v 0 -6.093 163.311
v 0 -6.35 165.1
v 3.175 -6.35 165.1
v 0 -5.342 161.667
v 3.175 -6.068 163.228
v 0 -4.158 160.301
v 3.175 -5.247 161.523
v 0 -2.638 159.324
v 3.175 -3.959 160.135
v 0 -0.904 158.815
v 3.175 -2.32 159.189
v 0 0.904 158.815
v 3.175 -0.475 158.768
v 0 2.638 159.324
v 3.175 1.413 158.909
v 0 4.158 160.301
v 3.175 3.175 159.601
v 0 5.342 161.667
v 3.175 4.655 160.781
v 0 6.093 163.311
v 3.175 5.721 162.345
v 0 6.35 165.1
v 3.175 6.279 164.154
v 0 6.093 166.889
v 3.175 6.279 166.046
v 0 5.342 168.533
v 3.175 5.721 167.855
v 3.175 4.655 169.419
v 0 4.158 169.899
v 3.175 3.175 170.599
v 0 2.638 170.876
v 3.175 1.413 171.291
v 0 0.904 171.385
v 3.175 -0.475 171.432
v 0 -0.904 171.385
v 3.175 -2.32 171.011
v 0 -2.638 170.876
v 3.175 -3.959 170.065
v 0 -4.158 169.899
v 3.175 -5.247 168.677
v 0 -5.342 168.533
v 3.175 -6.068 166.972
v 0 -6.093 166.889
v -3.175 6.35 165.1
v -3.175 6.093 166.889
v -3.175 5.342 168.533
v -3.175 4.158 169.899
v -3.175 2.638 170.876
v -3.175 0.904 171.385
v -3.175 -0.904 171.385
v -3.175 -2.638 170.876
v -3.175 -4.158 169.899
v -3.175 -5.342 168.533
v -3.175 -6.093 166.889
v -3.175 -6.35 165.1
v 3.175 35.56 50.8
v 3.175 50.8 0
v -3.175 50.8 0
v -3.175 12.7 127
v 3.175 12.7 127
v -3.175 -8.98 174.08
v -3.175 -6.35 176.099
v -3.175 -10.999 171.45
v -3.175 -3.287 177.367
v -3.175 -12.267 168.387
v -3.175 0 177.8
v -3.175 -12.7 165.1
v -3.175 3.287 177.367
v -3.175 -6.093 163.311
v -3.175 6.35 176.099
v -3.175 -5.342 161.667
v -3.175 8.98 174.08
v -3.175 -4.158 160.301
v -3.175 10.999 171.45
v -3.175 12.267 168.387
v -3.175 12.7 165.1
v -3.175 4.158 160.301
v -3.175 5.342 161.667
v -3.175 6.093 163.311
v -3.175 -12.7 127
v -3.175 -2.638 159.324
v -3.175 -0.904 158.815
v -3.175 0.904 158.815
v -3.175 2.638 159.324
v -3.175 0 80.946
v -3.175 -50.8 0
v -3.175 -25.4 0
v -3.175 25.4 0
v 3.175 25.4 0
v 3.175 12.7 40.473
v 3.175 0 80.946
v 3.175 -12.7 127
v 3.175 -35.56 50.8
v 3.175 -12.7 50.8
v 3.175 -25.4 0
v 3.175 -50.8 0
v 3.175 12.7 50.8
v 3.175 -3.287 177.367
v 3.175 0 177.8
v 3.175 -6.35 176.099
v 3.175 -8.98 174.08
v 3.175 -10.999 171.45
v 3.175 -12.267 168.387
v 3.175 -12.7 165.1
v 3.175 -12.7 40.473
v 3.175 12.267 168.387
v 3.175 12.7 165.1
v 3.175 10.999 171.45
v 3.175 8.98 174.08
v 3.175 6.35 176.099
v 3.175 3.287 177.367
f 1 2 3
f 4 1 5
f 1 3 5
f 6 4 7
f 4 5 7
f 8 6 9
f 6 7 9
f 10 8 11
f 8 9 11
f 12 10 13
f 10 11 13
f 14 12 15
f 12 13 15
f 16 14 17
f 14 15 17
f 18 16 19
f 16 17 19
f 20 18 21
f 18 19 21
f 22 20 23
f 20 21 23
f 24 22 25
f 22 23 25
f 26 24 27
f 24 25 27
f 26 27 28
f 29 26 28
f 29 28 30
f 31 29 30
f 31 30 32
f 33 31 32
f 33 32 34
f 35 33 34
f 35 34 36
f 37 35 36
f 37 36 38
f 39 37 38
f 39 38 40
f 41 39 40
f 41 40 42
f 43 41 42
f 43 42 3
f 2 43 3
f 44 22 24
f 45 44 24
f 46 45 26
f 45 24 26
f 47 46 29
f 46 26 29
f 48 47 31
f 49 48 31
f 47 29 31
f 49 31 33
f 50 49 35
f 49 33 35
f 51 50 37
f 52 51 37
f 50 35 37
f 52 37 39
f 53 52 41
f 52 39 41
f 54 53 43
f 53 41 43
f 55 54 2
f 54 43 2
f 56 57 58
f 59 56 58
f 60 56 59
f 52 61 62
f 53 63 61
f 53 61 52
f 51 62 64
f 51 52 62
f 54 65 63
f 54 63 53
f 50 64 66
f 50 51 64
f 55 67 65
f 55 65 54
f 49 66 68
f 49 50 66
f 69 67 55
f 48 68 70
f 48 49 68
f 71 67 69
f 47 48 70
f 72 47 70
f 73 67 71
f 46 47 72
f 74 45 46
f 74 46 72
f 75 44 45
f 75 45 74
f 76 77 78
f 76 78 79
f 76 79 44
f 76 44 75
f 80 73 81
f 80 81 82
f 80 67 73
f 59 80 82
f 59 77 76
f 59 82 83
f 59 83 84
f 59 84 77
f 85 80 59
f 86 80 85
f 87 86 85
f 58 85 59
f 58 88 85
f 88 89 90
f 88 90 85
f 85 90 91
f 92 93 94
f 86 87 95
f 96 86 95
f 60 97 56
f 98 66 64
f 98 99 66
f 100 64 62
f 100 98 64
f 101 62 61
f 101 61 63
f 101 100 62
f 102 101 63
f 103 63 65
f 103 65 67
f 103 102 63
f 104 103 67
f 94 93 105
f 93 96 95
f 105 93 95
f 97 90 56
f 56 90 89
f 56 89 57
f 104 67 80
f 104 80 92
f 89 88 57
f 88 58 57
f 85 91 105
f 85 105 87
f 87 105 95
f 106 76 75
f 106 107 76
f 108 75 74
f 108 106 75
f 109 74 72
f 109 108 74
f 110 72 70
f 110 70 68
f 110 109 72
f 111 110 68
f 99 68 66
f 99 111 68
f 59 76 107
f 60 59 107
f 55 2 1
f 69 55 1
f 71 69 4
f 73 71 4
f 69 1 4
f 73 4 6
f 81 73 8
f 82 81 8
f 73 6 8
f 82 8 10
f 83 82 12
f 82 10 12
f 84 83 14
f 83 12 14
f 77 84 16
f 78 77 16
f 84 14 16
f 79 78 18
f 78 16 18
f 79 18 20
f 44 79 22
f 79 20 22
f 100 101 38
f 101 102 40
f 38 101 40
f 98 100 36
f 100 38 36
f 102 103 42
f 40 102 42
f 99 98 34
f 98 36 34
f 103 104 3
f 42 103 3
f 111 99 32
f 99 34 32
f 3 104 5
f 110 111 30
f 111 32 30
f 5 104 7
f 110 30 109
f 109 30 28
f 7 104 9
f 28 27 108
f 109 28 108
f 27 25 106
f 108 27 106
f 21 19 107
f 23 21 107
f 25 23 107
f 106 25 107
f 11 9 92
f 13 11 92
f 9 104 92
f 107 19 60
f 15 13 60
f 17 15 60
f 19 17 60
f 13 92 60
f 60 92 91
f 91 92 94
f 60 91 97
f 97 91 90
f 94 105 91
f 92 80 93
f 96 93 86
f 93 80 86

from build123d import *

# Parameters (mm, degrees)
F0_W        = 6.35
F0_H        = 25.4
F1_DEPTH    = 177.8
F0_H_2      = 38.1
F2_DEPTH    = 50.8
F4_D        = 12.7
F4_DEPTH    = 3.176
F5_D        = 12.7
F6_R        = 12.69999
F7_DEPTH    = 127
F8_T4_DEPTH = 665.7191836207
F8_T9_DEPTH = 665.7191836207
F11_DEPTH   = 25.4


# Not quite as in the source:
# - a fillet or chamfer that OpenCascade refuses, or shapes differently, is made with other operations: its cross-section is extruded or revolved along the edge and cut away or added
# - two fillets or chamfers of one size are made in one step
# - a fillet or chamfer is up to 0.001 mm smaller than in the source, because OpenCascade refuses the exact size


with BuildPart() as f1:
    # F0 (on Top) → F1 (new body)
    with BuildSketch(Plane.XY):
        Rectangle(F0_W, F0_H)
    extrude(amount=F1_DEPTH)

    # F0 (on Top) → F2 (join)
    with BuildSketch(Plane.XY):
        with Locations((0, 31.75)):
            Rectangle(F0_W, F0_H_2)
        with Locations((0, -31.75)):
            Rectangle(F0_W, F0_H_2)
    extrude(amount=F2_DEPTH)

    # F4 (through all, one way)
    with BuildSketch(Plane.YZ):
        with Locations((0, 165.1)):
            Circle(F4_D / 2)
    extrude(amount=-F4_DEPTH, mode=Mode.SUBTRACT)

    # F5 (through all)
    with Locations(Plane(origin=(0, 0, 0), x_dir=(0, 1, 0), z_dir=(-1, 0, 0))):
        with Locations((0, -165.1)):
            Hole(F5_D / 2)

    # F6 (radius 12.7 in the source; OpenCascade refuses exactly that, so slightly less here)
    f6_edges = [f1.edges().sort_by_distance(p)[0] for p in [
        (0, -12.7, 177.8),
        (0, 12.7, 177.8),
    ]]
    fillet(f6_edges, radius=F6_R)

    # F0 (on Top) → F7 (join)
    with BuildSketch(Plane.XY):
        with Locations((0, -31.75)):
            Rectangle(F0_W, F0_H_2)
        with Locations((0, 31.75)):
            Rectangle(F0_W, F0_H_2)
    extrude(amount=F7_DEPTH)

    # F8: chamfer of 38.1 x 127 on 2 edges, made by hand


with BuildPart() as f8_tool2:
    # F8_s3 → F8_t4 (new body)
    with BuildSketch(Plane.YZ.offset(332.8595918104)):
        Polygon((50.8, 0), (12.7, 127), (50.8, 127), align=None)
    extrude(amount=-F8_T4_DEPTH)

    split(bisect_by=Plane.XZ.offset(-12.7), keep=Keep.BOTTOM)


with BuildPart() as f1_1:
    add(f1.part)

    # F8_t1: cut F8_tool2
    add(f8_tool2.part, mode=Mode.SUBTRACT)


with BuildPart() as f8_tool7:
    # F8_s8 → F8_t9 (new body)
    with BuildSketch(Plane.YZ.offset(-332.8595918104)):
        Polygon((-12.7, 127), (-50.8, 0), (-50.8, 127), align=None)
    extrude(amount=F8_T9_DEPTH)

    split(bisect_by=Plane.XZ.offset(12.7), keep=Keep.TOP)


with BuildPart() as f1_2:
    add(f1_1.part)

    # F8_t6: cut F8_tool7
    add(f8_tool7.part, mode=Mode.SUBTRACT)

    # F10 (on face) → F11 (cut)
    with BuildSketch(Plane.YZ.offset(3.175)):
        Polygon((25.4, 0), (0, 80.9457584765), (-25.4, 0), align=None)
    extrude(amount=-F11_DEPTH, mode=Mode.SUBTRACT)


solid = f1_2.part
